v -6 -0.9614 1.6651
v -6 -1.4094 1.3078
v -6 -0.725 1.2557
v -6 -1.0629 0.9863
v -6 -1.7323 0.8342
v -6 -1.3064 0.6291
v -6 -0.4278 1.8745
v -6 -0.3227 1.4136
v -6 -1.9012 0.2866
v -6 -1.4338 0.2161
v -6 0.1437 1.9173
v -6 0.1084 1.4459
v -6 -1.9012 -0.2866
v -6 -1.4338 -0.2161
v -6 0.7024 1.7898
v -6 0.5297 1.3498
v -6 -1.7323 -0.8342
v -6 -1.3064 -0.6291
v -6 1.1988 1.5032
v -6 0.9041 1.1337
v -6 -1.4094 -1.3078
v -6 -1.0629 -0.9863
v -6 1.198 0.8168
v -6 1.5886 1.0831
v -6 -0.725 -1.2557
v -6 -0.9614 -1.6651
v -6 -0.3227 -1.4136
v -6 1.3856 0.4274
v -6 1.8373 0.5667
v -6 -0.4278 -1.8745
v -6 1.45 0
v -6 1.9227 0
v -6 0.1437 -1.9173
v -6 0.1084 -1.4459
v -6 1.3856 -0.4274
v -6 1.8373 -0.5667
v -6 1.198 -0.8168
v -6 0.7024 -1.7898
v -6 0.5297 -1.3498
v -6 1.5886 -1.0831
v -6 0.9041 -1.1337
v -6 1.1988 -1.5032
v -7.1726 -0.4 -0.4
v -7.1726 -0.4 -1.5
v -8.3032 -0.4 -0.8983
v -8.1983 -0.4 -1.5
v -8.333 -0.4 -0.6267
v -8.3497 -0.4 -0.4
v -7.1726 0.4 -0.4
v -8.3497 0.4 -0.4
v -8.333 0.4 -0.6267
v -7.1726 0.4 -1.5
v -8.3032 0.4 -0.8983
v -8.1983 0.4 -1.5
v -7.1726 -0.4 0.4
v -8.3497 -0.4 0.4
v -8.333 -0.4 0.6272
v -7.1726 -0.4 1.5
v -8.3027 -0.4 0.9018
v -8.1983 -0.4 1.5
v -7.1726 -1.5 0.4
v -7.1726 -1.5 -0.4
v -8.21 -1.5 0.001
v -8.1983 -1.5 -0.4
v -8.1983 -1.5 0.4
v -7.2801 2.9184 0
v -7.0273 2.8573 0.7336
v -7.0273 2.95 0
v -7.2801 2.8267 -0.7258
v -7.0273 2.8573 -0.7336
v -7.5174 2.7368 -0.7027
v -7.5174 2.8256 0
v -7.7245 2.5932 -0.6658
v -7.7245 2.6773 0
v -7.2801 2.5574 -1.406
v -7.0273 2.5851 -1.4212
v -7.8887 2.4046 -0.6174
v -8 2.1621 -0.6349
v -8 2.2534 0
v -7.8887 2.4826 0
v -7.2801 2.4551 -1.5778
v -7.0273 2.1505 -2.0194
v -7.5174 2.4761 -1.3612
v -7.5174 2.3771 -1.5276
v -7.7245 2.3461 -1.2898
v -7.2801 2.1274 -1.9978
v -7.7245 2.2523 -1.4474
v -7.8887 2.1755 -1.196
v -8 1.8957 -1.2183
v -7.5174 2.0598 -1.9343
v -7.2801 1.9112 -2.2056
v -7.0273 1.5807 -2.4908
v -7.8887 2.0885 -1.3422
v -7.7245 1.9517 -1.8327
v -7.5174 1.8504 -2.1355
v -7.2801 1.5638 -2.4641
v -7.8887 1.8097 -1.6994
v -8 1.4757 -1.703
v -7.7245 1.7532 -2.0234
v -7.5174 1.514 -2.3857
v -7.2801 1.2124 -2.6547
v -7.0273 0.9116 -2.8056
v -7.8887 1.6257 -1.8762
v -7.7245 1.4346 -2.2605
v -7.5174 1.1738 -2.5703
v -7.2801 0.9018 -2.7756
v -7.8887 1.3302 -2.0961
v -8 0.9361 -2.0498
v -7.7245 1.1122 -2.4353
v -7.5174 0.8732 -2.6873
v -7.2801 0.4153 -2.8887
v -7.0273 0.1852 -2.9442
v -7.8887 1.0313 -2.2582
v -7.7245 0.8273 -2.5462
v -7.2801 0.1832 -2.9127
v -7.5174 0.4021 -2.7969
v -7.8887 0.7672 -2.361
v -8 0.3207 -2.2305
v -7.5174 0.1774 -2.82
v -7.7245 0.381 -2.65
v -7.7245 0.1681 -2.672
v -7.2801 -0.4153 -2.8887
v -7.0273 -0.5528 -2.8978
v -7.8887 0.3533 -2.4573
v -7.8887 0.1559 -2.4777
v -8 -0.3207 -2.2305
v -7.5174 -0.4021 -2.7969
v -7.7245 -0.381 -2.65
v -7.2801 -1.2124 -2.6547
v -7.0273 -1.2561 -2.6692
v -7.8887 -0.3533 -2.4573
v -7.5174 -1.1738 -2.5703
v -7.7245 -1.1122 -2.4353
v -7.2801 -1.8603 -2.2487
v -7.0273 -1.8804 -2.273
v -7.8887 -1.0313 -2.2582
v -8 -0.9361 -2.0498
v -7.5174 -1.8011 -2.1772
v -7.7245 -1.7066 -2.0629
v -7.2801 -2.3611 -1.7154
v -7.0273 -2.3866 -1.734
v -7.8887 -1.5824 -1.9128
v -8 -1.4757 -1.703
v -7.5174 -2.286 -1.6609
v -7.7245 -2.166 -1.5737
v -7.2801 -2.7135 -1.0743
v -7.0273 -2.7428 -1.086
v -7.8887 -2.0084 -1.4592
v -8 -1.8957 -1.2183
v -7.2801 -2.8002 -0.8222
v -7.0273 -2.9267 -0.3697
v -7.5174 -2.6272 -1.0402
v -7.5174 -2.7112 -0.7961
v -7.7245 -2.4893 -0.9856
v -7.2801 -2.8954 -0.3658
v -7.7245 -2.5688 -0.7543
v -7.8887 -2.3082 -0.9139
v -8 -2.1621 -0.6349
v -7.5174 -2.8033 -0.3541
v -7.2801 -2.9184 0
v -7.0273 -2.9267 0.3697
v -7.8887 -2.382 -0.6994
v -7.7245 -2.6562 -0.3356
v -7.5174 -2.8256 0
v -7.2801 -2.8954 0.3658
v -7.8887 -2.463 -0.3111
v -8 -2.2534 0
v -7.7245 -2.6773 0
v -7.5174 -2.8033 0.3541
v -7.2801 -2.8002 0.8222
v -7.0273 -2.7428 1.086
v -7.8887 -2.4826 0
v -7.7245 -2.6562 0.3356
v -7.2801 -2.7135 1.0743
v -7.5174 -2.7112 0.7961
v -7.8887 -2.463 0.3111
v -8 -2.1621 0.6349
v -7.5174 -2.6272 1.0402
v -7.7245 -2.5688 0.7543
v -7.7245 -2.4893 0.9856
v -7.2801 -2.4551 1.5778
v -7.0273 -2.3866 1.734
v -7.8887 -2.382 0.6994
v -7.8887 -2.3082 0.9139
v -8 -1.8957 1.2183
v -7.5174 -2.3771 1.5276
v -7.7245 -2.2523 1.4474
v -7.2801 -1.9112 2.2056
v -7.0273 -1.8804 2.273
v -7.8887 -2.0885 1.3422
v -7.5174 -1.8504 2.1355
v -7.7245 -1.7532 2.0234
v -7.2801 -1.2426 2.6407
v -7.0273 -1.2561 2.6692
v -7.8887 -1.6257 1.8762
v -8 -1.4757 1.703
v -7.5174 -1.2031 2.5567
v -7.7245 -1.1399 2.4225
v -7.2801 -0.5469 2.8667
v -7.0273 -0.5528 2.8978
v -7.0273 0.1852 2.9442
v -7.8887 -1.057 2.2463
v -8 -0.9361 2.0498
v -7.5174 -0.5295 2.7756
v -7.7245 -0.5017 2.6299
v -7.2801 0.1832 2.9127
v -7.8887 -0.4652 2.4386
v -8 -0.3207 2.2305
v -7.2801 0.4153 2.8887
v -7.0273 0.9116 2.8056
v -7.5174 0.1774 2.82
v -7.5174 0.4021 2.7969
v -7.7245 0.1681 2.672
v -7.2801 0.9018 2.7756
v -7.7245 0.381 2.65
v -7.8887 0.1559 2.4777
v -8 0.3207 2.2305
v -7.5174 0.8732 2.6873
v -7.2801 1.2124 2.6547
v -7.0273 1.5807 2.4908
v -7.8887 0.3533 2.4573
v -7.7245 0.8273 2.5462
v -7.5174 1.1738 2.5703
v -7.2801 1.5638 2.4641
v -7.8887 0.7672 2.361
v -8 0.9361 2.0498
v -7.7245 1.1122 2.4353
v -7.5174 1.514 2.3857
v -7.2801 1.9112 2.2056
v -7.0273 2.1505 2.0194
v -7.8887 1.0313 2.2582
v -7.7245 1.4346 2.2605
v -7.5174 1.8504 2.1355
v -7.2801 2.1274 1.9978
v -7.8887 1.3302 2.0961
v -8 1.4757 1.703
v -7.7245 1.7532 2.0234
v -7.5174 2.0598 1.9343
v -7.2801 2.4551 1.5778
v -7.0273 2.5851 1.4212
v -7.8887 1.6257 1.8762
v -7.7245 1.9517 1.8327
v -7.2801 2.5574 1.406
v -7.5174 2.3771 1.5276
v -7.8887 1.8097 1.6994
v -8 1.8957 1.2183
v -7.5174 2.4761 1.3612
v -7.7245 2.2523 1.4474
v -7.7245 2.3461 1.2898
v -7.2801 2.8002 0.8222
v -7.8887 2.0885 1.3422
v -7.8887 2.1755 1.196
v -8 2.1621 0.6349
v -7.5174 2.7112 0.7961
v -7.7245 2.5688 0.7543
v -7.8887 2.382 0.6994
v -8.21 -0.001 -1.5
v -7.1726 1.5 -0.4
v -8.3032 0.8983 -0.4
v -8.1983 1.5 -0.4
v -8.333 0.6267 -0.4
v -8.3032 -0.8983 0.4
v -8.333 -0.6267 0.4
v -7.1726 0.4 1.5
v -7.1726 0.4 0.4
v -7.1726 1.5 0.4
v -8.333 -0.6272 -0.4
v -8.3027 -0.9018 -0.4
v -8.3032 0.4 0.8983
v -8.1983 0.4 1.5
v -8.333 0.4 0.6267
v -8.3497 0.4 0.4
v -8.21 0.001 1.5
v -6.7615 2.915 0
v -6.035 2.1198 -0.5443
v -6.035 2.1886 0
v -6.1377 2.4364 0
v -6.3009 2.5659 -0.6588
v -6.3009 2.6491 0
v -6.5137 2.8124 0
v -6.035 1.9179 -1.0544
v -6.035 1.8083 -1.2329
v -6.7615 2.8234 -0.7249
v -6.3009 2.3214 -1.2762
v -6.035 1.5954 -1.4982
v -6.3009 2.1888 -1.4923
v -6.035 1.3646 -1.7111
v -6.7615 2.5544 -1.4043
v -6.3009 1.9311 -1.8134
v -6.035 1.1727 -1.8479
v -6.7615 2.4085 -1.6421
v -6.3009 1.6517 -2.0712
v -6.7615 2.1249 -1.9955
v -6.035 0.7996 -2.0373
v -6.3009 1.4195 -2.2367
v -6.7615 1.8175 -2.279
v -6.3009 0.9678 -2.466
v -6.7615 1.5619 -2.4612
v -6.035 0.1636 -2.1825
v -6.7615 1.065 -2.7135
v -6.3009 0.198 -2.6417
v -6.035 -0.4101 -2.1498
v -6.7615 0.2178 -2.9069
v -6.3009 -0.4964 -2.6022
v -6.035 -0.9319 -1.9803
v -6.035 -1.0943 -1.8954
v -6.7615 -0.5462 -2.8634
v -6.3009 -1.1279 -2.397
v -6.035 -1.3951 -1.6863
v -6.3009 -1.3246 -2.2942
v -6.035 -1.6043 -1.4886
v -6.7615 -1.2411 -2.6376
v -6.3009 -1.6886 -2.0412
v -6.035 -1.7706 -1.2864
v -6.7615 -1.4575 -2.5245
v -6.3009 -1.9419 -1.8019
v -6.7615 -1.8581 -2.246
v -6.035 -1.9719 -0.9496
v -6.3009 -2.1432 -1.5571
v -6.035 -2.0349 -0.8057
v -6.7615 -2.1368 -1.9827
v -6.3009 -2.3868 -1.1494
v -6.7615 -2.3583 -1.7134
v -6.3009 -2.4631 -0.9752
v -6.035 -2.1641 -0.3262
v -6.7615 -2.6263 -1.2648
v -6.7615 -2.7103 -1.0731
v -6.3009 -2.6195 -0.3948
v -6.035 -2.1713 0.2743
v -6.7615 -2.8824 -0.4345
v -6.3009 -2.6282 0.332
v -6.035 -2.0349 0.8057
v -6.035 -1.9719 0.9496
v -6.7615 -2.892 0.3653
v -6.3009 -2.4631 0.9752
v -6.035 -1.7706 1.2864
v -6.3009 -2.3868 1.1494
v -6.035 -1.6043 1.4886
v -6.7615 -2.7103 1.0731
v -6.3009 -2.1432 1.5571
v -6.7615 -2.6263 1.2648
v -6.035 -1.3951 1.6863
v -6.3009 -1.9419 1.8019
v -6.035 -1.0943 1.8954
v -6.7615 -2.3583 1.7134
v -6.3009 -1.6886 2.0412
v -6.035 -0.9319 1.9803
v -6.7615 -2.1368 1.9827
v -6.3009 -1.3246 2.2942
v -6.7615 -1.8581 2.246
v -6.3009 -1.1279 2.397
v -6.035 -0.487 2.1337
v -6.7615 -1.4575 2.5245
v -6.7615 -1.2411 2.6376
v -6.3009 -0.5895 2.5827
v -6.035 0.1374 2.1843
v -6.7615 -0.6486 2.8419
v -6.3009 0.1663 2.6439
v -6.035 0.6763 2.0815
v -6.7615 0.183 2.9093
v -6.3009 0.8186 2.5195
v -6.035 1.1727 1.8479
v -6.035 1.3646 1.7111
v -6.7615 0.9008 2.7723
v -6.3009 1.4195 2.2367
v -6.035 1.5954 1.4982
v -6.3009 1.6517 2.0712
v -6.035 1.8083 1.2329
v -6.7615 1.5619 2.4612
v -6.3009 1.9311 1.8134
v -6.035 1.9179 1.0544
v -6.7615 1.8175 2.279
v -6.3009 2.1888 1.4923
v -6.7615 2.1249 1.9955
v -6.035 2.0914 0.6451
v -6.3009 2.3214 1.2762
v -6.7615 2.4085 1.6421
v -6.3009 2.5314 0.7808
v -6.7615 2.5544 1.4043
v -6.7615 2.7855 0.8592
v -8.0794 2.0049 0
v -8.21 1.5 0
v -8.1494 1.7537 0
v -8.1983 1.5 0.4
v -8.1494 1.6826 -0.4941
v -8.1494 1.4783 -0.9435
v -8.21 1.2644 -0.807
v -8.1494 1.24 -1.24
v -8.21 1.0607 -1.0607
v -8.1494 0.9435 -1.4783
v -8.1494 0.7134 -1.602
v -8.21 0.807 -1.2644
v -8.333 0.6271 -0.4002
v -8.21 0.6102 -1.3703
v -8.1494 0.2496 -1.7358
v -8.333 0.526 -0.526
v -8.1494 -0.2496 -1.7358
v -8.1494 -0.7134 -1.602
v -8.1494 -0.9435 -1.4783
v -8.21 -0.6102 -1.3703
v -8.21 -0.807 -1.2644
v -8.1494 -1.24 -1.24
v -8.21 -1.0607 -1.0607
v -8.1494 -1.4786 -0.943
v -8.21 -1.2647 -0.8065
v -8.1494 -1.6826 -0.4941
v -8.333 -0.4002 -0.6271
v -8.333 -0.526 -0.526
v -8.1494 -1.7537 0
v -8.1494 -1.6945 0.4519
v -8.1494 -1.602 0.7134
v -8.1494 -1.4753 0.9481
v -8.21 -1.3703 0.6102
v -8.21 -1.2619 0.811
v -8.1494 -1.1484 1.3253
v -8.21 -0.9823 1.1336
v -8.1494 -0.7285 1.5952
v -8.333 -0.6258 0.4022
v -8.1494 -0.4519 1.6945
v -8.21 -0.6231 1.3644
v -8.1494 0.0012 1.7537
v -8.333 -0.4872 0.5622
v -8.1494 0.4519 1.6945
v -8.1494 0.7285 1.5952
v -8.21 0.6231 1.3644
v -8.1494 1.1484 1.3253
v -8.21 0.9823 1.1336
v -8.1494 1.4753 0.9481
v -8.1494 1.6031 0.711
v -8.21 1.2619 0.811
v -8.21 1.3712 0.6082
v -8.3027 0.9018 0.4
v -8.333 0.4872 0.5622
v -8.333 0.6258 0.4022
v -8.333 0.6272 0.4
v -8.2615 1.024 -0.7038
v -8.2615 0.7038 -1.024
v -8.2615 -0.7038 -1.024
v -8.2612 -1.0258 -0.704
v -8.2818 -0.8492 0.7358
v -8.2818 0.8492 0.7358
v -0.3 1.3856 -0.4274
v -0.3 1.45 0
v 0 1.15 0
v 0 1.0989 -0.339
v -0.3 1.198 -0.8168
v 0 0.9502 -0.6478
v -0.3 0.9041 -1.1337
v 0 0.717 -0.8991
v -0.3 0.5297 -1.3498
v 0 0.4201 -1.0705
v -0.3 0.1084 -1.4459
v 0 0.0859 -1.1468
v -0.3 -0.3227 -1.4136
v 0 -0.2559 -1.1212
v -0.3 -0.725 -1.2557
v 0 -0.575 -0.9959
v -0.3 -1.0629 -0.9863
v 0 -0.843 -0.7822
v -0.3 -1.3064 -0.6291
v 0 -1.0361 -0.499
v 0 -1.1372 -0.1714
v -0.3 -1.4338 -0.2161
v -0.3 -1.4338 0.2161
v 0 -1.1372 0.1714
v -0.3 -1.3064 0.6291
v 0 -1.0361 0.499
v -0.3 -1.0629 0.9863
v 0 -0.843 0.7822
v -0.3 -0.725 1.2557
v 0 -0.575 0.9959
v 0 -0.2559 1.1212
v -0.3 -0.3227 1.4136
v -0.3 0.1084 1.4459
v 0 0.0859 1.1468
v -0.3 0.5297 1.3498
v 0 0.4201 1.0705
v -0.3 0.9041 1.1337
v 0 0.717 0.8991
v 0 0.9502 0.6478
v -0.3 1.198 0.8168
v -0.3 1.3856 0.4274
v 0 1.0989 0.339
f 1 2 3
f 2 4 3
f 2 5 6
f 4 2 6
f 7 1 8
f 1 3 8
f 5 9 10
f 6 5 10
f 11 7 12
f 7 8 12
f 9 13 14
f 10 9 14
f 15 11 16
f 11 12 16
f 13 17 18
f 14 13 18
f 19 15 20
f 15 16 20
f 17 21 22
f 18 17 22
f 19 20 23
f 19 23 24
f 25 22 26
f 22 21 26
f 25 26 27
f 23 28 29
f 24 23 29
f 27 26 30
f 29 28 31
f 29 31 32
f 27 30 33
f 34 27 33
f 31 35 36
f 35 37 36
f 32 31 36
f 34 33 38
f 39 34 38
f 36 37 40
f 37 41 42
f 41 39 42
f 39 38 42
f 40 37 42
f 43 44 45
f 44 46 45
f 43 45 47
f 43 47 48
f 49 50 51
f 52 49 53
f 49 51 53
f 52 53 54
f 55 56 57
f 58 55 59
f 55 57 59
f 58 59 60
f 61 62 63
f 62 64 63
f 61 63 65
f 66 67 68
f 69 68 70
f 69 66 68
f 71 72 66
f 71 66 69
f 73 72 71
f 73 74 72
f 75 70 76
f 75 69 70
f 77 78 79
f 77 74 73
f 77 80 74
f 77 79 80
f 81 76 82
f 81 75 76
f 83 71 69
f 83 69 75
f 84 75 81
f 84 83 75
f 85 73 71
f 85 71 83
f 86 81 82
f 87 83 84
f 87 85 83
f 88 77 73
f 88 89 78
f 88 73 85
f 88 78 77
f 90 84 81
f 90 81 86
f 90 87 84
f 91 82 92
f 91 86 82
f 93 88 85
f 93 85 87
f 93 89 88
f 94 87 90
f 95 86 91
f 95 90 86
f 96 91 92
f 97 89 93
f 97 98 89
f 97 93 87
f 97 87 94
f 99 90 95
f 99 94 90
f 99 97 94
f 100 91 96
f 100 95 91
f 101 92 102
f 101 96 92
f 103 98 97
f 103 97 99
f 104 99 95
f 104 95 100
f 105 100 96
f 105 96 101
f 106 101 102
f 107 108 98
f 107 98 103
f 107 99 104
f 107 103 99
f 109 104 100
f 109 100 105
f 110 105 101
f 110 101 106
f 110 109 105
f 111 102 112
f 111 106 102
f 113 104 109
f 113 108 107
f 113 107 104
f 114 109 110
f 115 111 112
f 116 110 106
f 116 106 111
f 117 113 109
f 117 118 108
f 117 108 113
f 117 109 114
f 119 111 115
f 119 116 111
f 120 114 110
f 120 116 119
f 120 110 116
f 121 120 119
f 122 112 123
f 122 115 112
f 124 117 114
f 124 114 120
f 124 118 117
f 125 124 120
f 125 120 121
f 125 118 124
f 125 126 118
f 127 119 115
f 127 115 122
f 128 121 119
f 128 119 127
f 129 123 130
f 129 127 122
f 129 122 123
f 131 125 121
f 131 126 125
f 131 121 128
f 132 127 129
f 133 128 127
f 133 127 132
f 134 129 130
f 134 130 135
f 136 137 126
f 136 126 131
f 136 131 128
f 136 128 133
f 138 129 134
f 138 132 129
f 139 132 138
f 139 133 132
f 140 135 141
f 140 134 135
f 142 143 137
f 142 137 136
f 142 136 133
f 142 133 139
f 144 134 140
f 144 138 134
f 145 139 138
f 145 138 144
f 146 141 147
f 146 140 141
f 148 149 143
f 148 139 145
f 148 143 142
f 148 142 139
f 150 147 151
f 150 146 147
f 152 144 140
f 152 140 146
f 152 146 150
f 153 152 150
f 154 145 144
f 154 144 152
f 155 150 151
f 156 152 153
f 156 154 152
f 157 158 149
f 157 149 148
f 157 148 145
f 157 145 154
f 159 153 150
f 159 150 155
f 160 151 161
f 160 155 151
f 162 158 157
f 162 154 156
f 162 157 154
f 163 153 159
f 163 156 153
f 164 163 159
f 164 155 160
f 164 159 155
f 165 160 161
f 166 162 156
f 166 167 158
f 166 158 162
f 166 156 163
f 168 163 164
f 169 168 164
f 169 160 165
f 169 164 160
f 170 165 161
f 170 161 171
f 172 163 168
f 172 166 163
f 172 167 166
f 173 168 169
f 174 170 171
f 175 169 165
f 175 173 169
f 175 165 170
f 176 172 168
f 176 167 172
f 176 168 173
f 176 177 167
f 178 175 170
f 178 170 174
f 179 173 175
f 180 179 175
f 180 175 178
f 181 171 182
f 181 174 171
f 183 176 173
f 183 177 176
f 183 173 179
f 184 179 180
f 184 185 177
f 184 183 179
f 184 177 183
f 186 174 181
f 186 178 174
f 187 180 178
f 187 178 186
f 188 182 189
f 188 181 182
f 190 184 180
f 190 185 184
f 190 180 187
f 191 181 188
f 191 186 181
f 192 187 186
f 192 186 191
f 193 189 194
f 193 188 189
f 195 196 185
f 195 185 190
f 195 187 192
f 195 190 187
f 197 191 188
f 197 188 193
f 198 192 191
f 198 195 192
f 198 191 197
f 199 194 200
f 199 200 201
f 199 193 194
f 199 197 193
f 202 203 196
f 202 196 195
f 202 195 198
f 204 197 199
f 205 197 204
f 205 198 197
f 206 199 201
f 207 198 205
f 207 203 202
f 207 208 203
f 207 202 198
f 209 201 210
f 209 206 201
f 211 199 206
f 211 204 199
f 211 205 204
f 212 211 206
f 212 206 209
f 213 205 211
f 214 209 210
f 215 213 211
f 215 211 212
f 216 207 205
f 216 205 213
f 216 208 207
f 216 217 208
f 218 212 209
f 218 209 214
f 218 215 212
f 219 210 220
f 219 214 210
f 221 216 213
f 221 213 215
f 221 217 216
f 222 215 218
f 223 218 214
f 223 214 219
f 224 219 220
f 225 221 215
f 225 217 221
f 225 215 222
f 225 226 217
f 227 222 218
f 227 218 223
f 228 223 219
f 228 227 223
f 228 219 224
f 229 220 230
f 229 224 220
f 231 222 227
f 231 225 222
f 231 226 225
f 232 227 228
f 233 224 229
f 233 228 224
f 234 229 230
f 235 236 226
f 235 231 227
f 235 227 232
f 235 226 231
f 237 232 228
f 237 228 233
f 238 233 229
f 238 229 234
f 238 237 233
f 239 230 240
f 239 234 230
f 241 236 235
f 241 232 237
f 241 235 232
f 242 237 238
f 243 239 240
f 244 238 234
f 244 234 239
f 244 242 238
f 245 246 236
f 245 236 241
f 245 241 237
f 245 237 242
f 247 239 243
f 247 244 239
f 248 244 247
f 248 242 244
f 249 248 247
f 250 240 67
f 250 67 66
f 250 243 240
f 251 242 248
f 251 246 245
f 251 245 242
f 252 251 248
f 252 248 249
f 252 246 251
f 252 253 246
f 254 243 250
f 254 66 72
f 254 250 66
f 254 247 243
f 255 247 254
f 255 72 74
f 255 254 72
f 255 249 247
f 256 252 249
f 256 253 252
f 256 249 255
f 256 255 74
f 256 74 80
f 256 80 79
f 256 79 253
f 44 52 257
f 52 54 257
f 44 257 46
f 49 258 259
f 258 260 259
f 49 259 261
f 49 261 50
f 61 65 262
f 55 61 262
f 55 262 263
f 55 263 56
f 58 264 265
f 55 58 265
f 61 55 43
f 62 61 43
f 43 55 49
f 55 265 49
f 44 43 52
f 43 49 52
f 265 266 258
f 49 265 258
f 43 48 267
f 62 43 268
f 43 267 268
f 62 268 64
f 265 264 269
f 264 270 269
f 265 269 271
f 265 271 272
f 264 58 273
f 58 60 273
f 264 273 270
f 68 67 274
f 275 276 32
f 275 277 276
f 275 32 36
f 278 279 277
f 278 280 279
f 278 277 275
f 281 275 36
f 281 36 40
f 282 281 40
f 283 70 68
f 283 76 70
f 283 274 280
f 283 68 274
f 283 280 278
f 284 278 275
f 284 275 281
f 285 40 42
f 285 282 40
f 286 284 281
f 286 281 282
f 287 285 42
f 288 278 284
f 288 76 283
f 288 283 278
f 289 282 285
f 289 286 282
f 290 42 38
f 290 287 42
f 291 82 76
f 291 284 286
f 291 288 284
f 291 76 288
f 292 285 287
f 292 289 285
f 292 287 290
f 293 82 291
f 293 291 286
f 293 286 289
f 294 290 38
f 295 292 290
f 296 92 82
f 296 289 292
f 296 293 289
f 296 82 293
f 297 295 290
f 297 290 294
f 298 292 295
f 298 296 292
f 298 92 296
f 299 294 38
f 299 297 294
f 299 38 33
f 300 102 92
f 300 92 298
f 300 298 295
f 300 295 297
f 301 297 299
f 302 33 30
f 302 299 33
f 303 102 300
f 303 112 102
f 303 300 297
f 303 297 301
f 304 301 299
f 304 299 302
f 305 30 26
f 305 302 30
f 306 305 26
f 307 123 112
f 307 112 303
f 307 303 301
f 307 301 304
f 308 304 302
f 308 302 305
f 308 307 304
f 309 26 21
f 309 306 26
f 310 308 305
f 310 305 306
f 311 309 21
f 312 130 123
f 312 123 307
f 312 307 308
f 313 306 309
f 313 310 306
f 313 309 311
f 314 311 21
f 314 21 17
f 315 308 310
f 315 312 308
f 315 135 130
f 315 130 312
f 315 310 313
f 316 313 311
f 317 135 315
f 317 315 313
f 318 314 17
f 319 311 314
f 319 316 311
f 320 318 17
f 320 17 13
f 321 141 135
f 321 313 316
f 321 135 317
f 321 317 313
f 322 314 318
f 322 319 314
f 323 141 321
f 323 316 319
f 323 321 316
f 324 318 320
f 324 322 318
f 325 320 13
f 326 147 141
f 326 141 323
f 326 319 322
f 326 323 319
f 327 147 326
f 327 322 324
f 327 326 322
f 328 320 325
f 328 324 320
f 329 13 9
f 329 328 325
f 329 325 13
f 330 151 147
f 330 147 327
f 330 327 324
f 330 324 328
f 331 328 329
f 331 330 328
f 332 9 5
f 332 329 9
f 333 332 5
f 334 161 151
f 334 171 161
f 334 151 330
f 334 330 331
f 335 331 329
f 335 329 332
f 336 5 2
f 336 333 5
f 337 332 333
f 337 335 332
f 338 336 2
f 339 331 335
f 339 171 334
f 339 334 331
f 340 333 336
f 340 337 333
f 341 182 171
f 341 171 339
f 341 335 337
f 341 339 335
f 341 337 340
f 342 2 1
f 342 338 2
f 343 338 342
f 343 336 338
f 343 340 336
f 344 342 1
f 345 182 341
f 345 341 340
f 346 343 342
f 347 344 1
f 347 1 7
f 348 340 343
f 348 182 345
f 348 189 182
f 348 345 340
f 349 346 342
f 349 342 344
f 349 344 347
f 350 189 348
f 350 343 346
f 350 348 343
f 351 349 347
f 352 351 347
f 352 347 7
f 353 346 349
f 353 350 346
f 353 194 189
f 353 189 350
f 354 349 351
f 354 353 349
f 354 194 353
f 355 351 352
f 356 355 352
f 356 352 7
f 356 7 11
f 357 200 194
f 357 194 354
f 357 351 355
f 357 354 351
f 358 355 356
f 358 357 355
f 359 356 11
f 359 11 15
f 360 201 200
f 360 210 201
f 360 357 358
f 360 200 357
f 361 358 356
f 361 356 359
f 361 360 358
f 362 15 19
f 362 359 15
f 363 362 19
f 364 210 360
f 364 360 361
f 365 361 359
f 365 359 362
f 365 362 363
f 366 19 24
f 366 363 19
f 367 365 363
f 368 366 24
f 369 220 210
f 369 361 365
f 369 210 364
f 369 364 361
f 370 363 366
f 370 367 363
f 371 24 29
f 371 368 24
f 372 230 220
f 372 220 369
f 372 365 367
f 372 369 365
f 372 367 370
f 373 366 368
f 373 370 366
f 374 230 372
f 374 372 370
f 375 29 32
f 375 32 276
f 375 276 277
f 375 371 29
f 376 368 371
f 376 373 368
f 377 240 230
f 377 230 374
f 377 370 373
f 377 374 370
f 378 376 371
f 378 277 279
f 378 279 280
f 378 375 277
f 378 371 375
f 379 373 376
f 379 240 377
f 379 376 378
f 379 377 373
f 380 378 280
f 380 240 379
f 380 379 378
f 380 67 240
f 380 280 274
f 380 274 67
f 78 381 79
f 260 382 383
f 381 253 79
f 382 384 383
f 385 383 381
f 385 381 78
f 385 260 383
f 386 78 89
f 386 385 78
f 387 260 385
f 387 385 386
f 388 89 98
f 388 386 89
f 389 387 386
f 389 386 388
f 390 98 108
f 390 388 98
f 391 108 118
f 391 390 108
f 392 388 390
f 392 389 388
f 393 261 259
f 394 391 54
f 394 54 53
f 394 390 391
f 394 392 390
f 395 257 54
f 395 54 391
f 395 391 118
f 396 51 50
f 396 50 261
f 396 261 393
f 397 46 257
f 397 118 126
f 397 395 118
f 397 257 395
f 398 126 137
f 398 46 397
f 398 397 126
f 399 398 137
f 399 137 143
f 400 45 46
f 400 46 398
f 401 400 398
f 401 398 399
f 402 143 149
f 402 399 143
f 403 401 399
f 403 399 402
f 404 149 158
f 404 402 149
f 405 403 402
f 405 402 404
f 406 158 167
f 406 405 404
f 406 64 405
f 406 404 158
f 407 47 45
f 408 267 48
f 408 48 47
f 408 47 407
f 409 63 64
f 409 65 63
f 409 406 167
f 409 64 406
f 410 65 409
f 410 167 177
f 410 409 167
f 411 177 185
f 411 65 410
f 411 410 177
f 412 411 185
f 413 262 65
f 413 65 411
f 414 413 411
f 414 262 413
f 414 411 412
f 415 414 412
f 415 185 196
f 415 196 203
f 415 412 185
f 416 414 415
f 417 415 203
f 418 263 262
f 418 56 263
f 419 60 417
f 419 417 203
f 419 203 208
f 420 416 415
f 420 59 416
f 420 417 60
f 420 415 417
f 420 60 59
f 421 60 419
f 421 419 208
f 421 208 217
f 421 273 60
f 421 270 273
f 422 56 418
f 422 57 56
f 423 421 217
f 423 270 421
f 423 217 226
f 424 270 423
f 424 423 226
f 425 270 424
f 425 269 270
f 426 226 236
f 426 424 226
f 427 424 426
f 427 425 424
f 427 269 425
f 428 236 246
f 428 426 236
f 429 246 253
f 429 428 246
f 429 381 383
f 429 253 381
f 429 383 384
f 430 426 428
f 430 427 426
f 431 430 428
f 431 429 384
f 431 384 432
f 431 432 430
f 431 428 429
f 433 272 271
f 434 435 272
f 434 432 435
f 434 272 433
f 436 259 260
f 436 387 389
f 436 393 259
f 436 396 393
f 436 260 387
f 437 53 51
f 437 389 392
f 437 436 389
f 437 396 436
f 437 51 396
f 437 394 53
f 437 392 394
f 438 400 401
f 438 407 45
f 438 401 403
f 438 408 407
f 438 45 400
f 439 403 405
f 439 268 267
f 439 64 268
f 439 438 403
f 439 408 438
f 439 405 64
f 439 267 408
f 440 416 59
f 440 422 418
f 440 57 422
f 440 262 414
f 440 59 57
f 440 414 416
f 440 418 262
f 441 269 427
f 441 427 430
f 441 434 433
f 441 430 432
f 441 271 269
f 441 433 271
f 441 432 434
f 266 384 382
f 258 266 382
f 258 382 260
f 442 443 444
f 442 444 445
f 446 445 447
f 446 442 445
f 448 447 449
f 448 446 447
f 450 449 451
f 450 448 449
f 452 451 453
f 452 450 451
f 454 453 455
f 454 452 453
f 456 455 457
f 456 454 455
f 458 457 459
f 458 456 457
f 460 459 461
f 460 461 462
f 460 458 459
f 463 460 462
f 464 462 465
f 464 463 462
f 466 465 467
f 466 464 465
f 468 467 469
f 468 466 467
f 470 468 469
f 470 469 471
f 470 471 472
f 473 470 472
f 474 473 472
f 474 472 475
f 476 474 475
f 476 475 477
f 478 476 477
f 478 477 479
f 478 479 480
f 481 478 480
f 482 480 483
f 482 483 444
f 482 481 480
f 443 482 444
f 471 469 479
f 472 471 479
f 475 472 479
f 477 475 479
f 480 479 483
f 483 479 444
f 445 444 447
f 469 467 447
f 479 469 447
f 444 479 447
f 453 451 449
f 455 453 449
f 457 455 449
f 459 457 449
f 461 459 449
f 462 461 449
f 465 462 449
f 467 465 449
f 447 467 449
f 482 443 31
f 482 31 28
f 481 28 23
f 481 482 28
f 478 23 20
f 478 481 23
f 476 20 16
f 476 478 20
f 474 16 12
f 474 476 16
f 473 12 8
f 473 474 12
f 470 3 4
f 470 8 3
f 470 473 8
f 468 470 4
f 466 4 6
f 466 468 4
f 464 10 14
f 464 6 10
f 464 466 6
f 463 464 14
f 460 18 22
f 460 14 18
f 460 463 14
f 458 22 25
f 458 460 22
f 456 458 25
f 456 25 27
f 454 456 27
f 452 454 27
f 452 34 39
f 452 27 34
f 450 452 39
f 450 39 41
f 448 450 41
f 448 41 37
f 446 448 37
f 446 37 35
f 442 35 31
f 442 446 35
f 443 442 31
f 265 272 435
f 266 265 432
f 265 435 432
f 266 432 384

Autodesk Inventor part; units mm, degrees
ref_plane "YZ Plane" through (0, 0, 0) normal (1, 0, 0) x (0, 1, 0)
ref_plane "XZ Plane" through (0, 0, 0) normal (0, 1, 0) x (-1, 0, 0)
sketch "Эскиз1" plane through (0, 0, 0) normal (0, 0, 1) x (1, 0, 0)
  line L0 (0, 0) -> (-8.3726, 0)
  arc A0 (-6, 1.9227) -> (-8, 2.2534) centre (-7.0273, 1.9227) ccw
  line L1 (-6, 1.9227) -> (-6, 1.45)
  line L2 (-6, 1.45) -> (0, 1.45)
  line L3 (0, 1.45) -> (0, 0)
  line L4 (-8.6724, 2.95) -> (-6.1128, 2.95)
  arc A1 (-8, 2.2534) -> (-8.3726, 0) centre (-1.3726, 0) ccw
  dimension "d0" = 2.9
  dimension "d1" = 5.9
  dimension "d2" = 2
  dimension "d3" = 6
  dimension "d4" = 7
revolve "Вращение1" add sketch "Эскиз1" angle 360 about axis through (0, 0, 0) along (-1, 0, 0)
chamfer "Фаска1" distance 0.3 angle 45 1 edges at (0, -1.45, 0)
ref_plane "РабПлоскость2" through (-8.3726, 0, 0) normal (1, 0, 0) x (0, 0, -1)
sketch "Эскиз2" plane through (-8.3726, 0, 0) normal (1, 0, 0) x (0, 0, -1)
  line L0 (-0.4, 1.5) -> (0.4, 1.5)
  line L1 (0.4, 1.5) -> (0.4, -1.5)
  line L2 (0.4, -1.5) -> (-0.4, -1.5)
  line L3 (-0.4, -1.5) -> (-0.4, 1.5)
  line L4 (-1.5, 0.4) -> (1.5, 0.4)
  line L5 (1.5, 0.4) -> (1.5, -0.4)
  line L6 (1.5, -0.4) -> (-1.5, -0.4)
  line L7 (-1.5, -0.4) -> (-1.5, 0.4)
  point P0 (0, 0)
  point P1 (0, 1.5)
  point P2 (0, 0.4)
  point P3 (-1.5, 0)
  point P4 (-0.4, 0)
  point P5 (0.4, 0.4)
  point P6 (-0.4, 0.4)
  point P7 (-0.4, -0.4)
  point P8 (0.4, -0.4)
  dimension "d10" = 0.8
  dimension "d11" = 3
extrude "Выдавливание1" cut sketch "Эскиз2" along normal blind 1.2
properties part number "Винт М3х19"
